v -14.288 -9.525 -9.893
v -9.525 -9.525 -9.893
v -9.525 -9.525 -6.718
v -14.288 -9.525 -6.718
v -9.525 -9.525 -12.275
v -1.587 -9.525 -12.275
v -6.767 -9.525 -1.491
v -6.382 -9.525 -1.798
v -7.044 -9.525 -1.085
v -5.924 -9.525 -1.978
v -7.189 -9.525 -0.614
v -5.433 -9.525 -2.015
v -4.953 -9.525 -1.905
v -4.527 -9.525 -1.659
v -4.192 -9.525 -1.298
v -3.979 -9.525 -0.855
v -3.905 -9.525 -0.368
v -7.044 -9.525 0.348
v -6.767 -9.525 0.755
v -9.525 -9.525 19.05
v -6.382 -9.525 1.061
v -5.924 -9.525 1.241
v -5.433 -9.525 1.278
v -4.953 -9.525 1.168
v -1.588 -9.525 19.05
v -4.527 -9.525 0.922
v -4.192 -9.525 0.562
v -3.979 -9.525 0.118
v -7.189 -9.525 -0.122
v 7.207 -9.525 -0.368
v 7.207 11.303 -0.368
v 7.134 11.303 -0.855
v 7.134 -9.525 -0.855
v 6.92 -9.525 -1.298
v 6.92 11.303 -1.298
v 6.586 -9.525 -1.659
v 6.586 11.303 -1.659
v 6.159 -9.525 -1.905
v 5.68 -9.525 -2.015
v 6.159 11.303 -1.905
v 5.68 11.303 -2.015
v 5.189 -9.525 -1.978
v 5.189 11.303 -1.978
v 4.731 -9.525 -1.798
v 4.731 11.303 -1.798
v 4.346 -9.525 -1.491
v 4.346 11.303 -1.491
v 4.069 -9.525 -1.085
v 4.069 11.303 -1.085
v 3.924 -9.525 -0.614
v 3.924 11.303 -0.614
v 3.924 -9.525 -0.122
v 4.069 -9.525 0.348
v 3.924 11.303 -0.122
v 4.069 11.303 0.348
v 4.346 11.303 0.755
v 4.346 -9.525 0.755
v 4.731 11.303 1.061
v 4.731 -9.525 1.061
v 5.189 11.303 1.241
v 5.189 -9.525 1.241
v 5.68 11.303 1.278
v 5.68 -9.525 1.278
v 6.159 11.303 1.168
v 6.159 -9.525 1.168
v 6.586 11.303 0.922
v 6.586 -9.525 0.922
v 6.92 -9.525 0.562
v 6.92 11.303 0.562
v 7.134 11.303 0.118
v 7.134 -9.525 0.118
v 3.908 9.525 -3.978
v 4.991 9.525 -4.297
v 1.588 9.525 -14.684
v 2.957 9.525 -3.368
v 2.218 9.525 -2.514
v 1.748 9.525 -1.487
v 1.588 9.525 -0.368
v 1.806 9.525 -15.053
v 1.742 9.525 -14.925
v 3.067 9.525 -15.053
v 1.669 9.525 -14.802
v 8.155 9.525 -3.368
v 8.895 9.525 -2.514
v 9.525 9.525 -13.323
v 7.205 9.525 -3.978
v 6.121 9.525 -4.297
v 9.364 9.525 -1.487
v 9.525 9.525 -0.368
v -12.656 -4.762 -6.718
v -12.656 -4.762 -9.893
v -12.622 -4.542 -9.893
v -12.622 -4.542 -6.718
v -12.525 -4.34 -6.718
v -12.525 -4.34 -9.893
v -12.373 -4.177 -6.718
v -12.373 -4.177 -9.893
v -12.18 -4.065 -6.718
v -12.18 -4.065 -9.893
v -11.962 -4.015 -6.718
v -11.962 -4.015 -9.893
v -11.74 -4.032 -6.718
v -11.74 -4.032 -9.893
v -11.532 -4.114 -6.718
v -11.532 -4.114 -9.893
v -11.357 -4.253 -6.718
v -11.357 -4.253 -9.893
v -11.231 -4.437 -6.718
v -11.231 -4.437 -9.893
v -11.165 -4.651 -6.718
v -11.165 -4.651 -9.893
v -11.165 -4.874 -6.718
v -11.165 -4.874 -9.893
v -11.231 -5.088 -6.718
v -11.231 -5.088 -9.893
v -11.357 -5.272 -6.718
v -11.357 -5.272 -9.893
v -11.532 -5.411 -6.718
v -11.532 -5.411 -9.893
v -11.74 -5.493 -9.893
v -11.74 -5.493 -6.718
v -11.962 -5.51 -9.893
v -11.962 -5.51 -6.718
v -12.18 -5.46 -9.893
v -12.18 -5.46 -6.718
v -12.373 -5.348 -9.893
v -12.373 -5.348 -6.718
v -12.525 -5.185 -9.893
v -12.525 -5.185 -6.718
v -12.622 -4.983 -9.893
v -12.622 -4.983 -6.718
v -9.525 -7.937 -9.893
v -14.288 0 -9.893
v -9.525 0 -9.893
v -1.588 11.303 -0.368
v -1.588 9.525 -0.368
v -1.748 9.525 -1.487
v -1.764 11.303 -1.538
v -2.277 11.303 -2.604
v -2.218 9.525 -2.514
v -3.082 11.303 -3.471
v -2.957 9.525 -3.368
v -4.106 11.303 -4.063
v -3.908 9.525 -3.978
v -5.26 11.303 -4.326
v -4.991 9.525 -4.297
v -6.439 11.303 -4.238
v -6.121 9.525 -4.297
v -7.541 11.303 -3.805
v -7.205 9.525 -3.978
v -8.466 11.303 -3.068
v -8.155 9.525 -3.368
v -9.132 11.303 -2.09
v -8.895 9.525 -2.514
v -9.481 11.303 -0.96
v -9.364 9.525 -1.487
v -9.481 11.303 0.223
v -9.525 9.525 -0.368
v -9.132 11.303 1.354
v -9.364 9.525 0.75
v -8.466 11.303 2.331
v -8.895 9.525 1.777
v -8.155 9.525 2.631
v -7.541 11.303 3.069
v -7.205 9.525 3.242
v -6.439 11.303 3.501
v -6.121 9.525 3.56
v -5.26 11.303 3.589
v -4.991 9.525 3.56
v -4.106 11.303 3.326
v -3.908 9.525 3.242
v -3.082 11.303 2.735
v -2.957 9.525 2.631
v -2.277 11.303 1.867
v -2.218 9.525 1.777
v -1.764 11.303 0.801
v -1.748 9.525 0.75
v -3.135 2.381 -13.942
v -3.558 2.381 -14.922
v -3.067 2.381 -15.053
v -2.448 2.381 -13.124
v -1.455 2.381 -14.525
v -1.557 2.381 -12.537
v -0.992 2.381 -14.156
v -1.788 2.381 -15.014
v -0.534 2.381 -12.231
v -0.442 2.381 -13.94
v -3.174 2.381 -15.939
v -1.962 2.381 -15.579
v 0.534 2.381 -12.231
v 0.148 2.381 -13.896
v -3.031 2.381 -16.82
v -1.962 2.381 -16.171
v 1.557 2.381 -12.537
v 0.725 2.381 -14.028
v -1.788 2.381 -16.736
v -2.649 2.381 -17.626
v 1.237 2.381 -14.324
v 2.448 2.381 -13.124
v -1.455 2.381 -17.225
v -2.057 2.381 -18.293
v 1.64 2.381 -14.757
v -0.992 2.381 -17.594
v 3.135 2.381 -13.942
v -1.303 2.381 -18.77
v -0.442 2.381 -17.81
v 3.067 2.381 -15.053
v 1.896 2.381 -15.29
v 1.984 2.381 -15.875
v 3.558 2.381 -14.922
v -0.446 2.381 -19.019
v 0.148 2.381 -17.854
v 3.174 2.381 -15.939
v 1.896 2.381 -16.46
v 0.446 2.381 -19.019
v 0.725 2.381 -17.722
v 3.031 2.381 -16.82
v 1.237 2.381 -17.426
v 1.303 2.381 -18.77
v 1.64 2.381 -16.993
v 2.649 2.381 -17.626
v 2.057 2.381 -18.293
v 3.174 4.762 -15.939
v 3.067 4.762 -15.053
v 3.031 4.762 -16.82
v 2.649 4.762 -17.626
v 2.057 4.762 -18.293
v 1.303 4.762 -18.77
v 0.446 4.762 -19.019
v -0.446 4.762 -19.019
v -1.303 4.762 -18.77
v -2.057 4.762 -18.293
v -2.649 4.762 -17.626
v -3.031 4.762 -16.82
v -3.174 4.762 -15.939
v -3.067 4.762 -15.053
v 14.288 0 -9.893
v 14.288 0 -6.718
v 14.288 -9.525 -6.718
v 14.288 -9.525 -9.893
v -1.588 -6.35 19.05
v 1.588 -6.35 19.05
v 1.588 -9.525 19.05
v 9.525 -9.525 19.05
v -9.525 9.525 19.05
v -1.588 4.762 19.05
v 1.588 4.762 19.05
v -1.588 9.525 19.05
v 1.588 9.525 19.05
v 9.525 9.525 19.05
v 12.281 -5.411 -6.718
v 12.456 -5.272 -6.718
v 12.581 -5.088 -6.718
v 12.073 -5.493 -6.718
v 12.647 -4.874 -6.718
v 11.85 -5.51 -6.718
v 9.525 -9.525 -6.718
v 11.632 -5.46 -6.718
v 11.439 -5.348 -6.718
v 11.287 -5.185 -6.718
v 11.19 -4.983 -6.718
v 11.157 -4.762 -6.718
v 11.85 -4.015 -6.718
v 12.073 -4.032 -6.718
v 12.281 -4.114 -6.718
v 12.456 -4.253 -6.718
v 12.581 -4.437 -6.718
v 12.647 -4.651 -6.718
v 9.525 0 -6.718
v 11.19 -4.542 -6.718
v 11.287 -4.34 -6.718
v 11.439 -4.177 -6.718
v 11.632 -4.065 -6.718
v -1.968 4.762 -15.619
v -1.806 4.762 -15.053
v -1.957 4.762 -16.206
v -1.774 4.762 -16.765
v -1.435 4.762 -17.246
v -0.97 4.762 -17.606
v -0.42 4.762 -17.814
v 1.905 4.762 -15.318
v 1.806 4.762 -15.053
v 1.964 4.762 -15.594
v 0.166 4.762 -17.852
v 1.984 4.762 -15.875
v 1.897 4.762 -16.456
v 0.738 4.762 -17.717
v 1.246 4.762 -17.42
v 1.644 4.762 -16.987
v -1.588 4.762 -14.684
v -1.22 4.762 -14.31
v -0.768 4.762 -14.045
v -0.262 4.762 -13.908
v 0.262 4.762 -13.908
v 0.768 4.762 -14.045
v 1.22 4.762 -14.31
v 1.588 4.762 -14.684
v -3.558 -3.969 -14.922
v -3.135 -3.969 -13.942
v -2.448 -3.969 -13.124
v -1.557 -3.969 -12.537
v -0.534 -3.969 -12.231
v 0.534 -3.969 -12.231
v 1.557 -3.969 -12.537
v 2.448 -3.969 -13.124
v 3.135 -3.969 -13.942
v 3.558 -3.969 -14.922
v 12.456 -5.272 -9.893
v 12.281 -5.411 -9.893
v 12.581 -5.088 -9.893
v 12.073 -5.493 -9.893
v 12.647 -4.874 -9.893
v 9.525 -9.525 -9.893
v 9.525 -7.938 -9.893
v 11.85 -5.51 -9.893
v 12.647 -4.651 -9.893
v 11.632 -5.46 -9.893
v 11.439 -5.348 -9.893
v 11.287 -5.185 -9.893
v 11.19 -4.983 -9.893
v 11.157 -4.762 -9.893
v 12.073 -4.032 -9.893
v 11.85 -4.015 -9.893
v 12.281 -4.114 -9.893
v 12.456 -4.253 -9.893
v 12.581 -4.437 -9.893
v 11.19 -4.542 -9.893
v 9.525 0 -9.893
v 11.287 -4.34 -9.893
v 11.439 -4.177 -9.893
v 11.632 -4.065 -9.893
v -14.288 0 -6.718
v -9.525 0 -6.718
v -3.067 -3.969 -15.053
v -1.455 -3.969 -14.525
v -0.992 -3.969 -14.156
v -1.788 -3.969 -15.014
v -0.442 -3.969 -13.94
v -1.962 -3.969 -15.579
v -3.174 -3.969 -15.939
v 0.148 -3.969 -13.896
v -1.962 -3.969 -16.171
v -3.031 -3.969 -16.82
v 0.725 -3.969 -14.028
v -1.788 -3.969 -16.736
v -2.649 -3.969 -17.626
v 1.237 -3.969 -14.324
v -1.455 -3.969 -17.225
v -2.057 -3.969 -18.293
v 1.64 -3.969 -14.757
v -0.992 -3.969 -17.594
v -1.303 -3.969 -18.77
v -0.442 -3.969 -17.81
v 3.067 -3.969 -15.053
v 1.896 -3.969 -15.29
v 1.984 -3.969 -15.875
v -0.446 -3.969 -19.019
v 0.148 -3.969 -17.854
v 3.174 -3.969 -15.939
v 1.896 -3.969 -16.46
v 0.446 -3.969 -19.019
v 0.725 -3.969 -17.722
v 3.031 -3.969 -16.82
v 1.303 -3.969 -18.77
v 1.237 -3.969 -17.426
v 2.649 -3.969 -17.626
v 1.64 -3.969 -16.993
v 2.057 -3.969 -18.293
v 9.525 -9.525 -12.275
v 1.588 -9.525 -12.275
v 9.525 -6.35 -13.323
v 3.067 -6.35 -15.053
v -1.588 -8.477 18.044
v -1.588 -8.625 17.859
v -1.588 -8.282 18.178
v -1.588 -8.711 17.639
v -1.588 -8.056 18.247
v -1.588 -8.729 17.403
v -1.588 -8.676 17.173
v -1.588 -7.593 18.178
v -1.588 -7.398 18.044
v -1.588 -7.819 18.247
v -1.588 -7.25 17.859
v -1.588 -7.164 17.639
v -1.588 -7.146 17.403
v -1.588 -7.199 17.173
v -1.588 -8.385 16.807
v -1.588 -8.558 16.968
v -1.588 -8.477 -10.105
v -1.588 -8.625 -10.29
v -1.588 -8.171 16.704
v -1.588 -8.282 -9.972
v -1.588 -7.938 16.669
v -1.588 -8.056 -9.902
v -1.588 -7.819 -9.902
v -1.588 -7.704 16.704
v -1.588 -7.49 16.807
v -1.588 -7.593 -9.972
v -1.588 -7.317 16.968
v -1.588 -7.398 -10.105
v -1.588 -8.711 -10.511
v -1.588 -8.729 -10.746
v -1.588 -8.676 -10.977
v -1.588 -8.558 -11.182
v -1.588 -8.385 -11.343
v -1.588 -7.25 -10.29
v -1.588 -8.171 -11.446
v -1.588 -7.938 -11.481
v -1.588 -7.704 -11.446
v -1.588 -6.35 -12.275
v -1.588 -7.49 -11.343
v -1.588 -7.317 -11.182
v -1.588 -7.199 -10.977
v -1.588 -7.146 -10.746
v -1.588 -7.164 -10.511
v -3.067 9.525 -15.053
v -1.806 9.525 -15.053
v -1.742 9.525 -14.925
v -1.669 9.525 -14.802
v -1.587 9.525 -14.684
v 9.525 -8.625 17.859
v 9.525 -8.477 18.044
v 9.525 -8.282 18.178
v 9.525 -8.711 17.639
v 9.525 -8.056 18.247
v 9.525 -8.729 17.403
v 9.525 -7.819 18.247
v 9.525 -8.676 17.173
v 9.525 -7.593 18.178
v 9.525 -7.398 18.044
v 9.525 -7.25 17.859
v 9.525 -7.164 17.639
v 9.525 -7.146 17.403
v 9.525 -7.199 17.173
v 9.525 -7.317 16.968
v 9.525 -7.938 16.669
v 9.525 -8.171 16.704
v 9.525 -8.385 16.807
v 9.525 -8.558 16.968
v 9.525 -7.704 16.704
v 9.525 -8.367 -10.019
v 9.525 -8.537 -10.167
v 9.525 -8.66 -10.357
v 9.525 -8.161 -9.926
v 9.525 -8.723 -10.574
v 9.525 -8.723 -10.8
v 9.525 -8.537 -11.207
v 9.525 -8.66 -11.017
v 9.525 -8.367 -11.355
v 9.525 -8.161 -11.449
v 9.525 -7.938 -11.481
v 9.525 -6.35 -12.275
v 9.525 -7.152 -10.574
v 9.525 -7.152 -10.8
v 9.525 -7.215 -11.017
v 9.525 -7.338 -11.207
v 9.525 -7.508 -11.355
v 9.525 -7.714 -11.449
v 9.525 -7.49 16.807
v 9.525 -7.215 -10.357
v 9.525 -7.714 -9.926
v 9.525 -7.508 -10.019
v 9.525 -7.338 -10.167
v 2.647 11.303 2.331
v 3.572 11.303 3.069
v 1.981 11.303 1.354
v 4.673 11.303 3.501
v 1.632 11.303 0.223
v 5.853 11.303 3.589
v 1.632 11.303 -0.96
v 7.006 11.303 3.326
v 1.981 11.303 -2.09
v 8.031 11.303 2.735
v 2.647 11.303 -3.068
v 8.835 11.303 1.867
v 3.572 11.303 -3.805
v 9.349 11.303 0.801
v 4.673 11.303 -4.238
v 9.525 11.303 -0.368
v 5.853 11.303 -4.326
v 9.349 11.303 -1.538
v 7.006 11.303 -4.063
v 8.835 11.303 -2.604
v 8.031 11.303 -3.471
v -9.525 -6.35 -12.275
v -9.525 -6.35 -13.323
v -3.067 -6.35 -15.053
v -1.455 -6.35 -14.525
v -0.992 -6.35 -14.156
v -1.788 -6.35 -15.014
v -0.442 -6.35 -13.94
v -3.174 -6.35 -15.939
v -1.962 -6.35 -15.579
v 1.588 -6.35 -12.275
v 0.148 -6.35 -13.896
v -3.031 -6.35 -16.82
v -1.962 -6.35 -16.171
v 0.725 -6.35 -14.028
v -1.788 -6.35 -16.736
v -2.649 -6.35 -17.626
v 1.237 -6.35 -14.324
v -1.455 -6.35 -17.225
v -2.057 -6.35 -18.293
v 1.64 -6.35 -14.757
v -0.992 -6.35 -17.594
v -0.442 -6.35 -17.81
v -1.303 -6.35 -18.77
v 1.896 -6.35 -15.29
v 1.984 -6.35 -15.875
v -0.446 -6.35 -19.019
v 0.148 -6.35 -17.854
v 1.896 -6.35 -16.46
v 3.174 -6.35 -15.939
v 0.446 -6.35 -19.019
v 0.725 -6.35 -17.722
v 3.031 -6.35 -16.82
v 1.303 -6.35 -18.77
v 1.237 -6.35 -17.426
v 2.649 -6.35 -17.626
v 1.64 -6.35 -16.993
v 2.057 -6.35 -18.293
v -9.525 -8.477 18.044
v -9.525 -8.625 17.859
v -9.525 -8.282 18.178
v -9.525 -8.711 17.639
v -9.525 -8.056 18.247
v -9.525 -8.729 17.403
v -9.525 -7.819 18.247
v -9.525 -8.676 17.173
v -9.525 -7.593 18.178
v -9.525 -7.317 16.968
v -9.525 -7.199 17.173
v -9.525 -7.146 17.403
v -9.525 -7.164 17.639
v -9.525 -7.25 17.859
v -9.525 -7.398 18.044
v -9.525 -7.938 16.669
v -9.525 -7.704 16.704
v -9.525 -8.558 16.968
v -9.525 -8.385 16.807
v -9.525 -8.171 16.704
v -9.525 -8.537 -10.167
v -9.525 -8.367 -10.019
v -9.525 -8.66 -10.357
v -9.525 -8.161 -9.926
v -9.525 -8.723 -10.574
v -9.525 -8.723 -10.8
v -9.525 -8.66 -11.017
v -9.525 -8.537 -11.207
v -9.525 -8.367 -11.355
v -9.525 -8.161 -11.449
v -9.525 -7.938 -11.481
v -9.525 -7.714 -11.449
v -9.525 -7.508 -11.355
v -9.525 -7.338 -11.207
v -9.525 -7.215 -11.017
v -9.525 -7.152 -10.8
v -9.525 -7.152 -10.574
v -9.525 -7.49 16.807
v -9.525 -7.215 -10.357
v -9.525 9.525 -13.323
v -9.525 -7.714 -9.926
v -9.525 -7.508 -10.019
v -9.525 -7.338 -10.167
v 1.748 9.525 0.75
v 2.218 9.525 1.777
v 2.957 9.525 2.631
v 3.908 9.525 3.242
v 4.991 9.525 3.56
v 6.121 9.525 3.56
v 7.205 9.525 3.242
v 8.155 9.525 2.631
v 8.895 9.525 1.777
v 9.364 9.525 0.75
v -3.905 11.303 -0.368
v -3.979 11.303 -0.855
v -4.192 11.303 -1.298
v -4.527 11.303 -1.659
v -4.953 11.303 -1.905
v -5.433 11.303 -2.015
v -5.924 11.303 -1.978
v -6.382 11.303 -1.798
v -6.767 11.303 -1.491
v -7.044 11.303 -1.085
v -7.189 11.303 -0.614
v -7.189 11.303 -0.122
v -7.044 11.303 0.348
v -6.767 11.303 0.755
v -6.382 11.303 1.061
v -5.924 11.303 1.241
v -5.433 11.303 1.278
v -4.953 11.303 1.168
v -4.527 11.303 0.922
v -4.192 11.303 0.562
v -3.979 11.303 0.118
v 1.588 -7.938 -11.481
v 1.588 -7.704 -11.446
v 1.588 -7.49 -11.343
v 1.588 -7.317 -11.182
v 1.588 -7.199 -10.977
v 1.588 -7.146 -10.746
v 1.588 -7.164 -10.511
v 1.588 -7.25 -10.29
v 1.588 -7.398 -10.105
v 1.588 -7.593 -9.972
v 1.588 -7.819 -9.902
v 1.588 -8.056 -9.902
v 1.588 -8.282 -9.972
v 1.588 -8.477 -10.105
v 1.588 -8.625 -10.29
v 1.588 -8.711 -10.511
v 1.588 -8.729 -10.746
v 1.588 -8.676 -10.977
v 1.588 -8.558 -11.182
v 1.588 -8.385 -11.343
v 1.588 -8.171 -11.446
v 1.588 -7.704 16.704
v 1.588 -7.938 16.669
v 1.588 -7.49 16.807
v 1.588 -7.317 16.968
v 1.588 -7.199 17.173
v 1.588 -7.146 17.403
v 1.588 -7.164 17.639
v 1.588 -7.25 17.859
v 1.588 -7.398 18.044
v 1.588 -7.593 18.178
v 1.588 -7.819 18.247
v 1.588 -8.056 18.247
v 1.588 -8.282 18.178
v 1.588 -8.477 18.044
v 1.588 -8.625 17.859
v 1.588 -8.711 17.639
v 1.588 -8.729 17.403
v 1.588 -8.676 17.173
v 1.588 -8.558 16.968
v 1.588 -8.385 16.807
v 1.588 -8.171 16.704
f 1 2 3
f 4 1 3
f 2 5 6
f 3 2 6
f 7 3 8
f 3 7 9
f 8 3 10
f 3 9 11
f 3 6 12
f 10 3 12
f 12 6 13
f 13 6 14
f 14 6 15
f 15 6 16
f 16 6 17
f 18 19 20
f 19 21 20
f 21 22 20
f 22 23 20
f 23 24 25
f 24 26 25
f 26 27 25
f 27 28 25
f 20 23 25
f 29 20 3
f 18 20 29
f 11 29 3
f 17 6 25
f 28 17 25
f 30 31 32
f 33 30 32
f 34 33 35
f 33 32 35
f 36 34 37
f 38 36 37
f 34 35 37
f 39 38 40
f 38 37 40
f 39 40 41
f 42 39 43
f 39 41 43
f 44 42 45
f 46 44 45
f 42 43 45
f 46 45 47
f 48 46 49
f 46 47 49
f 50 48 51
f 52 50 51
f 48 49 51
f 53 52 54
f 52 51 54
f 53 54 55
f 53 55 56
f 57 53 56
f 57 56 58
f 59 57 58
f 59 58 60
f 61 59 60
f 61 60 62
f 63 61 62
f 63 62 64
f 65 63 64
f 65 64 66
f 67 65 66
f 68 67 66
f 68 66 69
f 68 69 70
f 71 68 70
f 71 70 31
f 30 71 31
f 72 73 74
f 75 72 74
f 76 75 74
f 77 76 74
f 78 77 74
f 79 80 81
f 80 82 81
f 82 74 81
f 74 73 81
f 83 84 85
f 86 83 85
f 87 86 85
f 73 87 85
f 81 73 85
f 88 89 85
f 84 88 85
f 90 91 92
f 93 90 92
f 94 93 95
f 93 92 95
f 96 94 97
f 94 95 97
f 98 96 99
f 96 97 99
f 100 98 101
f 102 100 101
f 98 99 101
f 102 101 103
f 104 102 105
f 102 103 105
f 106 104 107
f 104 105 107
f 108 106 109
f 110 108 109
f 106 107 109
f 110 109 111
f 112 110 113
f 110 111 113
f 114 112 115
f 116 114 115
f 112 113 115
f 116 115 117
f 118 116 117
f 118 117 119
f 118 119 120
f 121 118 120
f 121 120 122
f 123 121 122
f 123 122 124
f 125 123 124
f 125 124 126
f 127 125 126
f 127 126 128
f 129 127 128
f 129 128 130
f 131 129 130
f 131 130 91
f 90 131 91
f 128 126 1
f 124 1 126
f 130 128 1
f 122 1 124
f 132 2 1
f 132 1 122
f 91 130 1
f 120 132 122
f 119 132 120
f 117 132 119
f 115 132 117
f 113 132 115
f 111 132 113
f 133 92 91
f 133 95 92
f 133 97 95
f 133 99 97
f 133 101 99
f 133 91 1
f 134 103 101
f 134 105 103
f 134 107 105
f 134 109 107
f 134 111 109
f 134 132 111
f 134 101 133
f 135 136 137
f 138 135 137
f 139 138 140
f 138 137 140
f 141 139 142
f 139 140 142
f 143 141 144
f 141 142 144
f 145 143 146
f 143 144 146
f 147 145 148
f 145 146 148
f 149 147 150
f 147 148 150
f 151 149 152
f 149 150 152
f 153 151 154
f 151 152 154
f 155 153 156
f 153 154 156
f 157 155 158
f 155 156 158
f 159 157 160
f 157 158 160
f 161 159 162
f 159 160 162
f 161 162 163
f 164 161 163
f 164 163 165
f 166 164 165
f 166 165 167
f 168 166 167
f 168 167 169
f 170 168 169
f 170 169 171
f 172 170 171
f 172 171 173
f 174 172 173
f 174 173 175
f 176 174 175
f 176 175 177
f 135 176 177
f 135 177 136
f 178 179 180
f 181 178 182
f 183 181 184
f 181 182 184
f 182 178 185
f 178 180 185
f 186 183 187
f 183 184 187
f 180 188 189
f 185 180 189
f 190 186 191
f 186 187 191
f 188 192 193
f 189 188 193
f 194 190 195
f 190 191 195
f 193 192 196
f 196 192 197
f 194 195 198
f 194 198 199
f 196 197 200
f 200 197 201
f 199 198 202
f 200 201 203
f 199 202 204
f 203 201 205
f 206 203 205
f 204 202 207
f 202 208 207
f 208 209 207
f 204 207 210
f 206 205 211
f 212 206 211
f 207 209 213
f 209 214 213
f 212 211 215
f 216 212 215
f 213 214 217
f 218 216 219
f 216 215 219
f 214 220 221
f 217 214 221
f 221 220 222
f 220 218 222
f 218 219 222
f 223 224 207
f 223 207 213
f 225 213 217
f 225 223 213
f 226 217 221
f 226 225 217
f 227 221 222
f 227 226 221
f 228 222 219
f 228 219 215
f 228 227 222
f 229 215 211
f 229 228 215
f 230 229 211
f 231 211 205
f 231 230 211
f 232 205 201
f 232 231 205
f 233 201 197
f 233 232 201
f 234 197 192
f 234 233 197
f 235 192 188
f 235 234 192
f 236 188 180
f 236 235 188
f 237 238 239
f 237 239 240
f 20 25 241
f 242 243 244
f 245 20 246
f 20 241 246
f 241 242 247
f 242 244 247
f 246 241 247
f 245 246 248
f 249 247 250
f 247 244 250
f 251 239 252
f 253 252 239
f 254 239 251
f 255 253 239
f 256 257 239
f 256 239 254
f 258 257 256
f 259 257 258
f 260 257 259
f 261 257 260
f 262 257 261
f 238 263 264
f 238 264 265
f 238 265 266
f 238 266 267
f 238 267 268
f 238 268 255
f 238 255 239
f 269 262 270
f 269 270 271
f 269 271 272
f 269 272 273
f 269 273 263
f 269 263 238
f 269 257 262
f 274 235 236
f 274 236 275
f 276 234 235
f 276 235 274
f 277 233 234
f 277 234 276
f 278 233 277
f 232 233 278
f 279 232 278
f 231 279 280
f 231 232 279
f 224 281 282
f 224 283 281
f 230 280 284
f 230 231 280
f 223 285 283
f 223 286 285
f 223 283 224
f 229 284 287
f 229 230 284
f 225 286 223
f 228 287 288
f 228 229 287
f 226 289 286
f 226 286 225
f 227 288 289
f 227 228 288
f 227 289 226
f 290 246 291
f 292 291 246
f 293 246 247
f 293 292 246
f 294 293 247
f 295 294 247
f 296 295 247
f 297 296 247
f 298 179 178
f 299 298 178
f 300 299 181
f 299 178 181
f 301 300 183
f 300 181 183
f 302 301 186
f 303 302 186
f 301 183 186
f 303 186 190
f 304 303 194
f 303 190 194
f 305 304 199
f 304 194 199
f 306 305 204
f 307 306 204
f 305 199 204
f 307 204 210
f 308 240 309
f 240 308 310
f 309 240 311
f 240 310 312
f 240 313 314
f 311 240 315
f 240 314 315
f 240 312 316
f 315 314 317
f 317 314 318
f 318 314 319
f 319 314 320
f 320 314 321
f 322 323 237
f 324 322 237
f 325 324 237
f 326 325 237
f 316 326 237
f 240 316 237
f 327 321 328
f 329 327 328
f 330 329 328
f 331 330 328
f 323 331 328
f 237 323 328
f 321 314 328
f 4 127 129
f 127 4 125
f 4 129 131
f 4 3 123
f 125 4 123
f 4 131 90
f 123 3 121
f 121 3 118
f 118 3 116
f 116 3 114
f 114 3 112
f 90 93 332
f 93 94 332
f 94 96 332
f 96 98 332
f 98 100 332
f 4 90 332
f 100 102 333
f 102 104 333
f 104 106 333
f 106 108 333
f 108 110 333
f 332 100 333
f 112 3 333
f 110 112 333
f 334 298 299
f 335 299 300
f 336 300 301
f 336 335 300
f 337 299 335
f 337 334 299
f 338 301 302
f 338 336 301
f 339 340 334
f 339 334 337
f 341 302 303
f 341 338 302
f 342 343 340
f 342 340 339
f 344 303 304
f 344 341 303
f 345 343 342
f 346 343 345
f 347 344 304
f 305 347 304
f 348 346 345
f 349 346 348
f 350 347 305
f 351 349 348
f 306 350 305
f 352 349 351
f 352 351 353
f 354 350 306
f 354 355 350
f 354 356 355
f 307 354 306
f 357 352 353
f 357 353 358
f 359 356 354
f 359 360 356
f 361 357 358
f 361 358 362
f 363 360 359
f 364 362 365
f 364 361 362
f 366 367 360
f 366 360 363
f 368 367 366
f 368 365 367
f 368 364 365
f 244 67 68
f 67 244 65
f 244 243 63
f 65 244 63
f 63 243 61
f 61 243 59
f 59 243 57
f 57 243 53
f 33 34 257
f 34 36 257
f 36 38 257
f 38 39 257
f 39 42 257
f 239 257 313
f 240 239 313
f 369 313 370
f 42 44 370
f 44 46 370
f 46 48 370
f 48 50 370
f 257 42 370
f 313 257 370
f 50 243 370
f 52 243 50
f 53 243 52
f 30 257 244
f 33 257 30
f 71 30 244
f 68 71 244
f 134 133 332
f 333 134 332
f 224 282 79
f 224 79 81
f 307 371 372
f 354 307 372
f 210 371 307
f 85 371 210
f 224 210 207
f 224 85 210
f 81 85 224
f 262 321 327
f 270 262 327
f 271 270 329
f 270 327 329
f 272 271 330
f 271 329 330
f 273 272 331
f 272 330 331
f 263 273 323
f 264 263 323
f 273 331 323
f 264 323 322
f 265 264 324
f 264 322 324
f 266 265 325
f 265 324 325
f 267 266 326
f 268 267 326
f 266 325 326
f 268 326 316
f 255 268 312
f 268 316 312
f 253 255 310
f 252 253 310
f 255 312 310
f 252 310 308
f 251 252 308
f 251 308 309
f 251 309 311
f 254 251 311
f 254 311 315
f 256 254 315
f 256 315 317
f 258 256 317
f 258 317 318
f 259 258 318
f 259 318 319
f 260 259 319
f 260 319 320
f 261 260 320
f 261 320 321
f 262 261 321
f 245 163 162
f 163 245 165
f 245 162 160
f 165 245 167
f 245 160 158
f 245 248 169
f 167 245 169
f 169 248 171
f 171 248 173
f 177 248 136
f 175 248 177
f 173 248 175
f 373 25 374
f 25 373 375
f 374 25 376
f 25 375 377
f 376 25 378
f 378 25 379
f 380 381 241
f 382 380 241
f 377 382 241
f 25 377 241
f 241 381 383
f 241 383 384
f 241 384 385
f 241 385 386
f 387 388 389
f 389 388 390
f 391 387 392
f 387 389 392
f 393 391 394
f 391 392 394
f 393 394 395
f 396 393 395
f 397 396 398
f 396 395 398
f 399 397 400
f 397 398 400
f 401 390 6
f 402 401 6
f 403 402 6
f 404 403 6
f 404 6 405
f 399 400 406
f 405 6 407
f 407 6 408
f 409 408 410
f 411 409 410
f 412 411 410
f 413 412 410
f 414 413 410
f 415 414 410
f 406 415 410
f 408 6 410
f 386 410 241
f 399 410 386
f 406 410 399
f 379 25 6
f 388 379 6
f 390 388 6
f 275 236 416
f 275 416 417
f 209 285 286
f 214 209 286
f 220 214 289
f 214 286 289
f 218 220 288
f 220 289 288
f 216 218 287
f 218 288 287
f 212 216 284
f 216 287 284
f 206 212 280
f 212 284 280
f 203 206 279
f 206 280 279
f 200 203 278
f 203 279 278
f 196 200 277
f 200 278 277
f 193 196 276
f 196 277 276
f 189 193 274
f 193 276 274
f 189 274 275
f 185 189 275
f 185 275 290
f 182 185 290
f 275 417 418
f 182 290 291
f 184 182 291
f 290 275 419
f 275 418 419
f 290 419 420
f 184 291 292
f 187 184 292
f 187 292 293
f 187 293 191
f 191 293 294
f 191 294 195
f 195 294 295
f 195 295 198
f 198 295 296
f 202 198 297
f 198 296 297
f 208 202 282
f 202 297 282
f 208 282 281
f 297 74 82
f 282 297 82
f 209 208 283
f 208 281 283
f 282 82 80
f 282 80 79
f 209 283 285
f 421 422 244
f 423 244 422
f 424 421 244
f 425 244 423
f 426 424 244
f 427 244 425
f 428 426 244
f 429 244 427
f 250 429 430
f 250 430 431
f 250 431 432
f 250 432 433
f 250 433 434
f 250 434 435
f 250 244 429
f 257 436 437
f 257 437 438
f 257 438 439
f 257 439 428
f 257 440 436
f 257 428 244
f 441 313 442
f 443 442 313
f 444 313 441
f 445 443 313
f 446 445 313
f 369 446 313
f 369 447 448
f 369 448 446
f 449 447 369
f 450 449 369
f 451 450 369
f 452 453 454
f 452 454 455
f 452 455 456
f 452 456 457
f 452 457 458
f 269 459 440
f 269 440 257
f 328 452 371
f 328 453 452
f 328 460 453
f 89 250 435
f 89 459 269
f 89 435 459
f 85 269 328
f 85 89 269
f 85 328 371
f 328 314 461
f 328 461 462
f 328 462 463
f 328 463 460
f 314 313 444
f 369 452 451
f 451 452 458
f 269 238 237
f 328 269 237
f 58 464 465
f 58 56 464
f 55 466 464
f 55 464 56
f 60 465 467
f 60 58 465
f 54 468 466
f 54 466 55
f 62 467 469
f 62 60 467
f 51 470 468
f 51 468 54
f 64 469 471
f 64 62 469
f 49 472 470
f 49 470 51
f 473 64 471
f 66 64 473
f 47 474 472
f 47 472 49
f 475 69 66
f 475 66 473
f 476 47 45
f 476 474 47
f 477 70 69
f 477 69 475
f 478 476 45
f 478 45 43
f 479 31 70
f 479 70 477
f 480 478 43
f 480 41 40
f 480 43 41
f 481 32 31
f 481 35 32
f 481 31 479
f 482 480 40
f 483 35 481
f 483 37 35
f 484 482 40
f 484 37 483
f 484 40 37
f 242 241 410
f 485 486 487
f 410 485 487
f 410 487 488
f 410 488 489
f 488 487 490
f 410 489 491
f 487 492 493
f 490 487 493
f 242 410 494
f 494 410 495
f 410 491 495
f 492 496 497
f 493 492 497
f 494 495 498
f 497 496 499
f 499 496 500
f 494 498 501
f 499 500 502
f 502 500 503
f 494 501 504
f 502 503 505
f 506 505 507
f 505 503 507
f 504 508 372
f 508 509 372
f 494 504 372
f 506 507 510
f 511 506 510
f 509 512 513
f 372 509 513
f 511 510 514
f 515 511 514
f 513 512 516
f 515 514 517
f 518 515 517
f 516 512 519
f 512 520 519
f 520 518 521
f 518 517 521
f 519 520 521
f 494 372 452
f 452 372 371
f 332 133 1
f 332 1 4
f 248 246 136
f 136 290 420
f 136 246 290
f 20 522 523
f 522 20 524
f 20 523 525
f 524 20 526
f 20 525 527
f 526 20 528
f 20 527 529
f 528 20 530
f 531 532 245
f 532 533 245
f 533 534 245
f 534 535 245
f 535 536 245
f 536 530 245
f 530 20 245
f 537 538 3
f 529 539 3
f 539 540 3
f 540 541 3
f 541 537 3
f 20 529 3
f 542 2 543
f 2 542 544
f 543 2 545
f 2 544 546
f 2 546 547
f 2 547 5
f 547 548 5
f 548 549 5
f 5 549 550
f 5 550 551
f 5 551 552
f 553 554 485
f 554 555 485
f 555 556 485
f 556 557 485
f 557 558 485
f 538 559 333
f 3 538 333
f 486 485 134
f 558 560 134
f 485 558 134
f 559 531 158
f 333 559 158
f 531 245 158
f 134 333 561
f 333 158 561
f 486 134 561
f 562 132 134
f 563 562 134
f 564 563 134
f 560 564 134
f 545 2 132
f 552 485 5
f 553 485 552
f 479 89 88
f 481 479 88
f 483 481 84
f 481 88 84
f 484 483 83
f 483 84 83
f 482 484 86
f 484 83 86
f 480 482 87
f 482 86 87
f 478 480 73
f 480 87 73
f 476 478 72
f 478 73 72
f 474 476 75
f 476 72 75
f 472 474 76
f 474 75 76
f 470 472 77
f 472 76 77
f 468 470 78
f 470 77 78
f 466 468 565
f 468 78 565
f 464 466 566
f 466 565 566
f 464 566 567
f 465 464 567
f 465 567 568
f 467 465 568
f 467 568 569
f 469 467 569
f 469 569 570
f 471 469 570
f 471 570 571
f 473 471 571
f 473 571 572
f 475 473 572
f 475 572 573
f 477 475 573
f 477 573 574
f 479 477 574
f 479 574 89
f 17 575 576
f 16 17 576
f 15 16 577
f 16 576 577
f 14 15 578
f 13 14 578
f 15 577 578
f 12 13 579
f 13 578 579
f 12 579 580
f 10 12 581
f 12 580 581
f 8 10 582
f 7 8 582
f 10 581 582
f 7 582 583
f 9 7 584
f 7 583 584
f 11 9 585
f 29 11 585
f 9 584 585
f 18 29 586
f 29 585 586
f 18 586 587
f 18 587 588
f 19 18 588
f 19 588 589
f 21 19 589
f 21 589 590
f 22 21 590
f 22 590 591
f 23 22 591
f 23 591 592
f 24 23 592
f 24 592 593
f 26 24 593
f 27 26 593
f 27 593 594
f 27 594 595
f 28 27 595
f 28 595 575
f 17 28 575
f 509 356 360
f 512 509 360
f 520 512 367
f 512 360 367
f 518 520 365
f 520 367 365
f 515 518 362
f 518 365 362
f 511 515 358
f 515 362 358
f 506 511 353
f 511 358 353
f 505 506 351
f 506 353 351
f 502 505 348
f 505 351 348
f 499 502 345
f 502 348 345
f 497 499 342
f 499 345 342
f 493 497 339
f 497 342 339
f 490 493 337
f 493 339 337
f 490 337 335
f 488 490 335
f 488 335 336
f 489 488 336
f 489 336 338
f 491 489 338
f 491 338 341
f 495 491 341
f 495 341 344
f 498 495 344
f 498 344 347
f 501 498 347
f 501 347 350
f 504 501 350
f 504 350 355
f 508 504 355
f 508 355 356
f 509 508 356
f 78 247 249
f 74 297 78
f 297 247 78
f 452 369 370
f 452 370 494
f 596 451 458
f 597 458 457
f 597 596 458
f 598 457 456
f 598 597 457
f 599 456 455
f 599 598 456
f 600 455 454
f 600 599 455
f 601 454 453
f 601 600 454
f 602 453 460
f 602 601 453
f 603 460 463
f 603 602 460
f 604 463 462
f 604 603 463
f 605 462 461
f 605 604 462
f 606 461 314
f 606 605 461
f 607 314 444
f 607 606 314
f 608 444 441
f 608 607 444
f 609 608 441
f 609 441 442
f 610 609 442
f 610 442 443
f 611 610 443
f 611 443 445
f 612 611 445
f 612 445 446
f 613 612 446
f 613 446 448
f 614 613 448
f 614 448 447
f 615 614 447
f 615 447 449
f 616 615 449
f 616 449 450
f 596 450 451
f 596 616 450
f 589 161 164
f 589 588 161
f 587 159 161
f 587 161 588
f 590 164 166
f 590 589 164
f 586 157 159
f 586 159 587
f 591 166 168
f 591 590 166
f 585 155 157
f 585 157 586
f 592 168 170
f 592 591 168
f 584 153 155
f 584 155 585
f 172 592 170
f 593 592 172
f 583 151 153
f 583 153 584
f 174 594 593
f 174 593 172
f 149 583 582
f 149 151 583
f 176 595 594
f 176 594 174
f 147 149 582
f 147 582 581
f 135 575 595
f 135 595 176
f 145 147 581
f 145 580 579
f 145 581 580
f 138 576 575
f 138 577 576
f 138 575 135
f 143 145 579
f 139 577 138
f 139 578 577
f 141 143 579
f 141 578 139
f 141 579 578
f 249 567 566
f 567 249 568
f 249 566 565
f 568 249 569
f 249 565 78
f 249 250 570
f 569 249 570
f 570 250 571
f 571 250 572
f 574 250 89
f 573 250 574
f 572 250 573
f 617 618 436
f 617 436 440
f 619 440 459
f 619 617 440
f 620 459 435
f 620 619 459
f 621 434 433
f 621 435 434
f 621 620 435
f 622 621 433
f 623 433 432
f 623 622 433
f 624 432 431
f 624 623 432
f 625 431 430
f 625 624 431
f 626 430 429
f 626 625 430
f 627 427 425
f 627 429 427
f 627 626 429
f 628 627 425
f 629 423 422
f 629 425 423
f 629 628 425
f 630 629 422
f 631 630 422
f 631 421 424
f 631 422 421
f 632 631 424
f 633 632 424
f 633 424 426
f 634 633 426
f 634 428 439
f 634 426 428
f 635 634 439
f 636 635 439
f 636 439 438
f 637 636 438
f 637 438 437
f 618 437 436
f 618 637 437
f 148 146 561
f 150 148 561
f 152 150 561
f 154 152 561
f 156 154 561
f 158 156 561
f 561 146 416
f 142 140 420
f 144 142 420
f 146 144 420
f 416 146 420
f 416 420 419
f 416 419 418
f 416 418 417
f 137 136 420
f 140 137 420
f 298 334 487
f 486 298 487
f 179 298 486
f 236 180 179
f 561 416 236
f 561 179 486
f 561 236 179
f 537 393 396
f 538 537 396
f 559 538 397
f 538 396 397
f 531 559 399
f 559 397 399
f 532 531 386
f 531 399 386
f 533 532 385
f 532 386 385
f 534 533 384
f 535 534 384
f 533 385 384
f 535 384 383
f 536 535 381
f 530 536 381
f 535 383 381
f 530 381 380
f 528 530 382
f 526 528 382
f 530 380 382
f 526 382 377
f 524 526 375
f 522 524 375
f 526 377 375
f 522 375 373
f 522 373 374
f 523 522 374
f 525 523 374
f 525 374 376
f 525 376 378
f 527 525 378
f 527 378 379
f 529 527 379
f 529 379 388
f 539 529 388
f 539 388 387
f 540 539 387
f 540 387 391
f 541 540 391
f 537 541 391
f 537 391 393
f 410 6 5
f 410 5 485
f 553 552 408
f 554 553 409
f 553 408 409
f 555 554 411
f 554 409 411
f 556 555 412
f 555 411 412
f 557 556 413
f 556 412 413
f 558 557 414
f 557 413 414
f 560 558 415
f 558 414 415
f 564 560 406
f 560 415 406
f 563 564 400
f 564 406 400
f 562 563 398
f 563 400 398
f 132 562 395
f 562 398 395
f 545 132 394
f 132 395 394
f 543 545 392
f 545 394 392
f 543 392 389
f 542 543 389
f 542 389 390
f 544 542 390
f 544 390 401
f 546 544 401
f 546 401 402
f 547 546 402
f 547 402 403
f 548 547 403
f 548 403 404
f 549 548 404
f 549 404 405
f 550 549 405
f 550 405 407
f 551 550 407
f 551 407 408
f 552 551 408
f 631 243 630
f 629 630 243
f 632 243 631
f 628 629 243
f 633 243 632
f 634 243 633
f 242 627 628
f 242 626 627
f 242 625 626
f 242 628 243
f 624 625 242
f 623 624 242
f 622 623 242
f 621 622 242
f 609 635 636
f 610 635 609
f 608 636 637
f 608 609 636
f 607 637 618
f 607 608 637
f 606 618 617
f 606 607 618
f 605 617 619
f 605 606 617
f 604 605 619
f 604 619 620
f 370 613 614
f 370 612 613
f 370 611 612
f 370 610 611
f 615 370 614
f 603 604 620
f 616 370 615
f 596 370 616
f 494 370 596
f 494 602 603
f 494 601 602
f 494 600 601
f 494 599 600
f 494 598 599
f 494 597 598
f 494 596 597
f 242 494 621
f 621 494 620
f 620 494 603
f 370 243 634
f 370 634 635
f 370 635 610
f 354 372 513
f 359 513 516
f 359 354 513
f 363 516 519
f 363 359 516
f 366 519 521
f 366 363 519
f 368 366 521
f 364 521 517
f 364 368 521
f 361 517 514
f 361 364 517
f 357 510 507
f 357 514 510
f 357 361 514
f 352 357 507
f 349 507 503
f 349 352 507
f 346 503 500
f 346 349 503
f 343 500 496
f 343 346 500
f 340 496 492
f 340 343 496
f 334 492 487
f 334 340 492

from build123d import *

# Parameters (mm, degrees)
SKETCH1_W                = 38.1
SKETCH1_H                = 19.05
BOSS_EXTRUDE1_DEPTH      = 9.525
CUT_EXTRUDE1_DEPTH       = 10.525
CUT_EXTRUDE1_DEPTH_BACK  = 10.525
SKETCH3_R                = 1.984375
CUT_EXTRUDE2_DEPTH       = 10.525
CUT_EXTRUDE2_DEPTH_BACK  = 10.525
SKETCH4_W                = 3.175
SKETCH4_H                = 4.7625
SKETCH4_H_2              = 3.175
CUT_EXTRUDE3_DEPTH       = 20.05
CUT_EXTRUDE3_DEPTH_BACK  = 20.05
CUT_EXTRUDE9_START       = -2.38125
SKETCH11_R               = 3.683
CUT_EXTRUDE9_DEPTH       = 6.35
SKETCH12_W               = 6.35
SKETCH12_H               = 3.175
CUT_EXTRUDE10_DEPTH      = 10.525
CUT_EXTRUDE10_DEPTH_BACK = 10.525
SKETCH14_R               = 0.79375
CUT_EXTRUDE11_DEPTH      = 10.525
CUT_EXTRUDE11_DEPTH_BACK = 10.525
CUT_EXTRUDE12_DEPTH      = 4.7625
SKETCH16_W               = 3.175
SKETCH16_H               = 9.525
BOSS_EXTRUDE2_DEPTH      = 4.7625
SKETCH17_W               = 3.175
SKETCH17_H               = 9.525
BOSS_EXTRUDE3_DEPTH      = 4.7625
SKETCH18_R               = 0.7493
CUT_EXTRUDE13_DEPTH      = 29.943380657
SKETCH19_R               = 3.96875
BOSS_EXTRUDE4_DEPTH      = 1.778
SKETCH20_R               = 1.651
CUT_EXTRUDE14_DEPTH      = 21.828


with BuildPart() as part:
    # Sketch1 → Boss-Extrude1 (new body, symmetric)
    with BuildSketch(Plane(origin=(0, 0, 0), x_dir=(0, 0, -1), z_dir=(1, 0, 0))):
        Rectangle(SKETCH1_W, SKETCH1_H)
    extrude(amount=BOSS_EXTRUDE1_DEPTH, both=True)

    # Sketch2 → Cut-Extrude1 (cut, two sides)
    with BuildSketch(Plane(origin=(0, 0, 0), x_dir=(1, 0, 0), z_dir=(0, 1, 0))) as cut_extrude1_sk:
        with BuildLine():
            Line((91.748361933, -8.708899487), (9.525, 13.322783942))
            Line((9.525, 13.322783942), (3.066814498, 15.053249532))
            ThreePointArc((3.066814498, 15.053249532), (0, 19.05), (-3.066814498, 15.053249532))
            Line((-3.066814498, 15.053249532), (-9.525, 13.322783942))
            Line((-9.525, 13.322783942), (-91.748361933, -8.708899487))
            Line((-91.748361933, -8.708899487), (-91.748361933, 161.538876678))
            Line((-91.748361933, 161.538876678), (91.748361933, 161.538876678))
            Line((91.748361933, 161.538876678), (91.748361933, -8.708899487))
        make_face()
    extrude(amount=CUT_EXTRUDE1_DEPTH, mode=Mode.SUBTRACT)
    extrude(cut_extrude1_sk.sketch, amount=-CUT_EXTRUDE1_DEPTH_BACK, mode=Mode.SUBTRACT)

    # Sketch3 → Cut-Extrude2 (cut, two sides)
    with BuildSketch(Plane(origin=(0, 0, 0), x_dir=(1, 0, 0), z_dir=(0, 1, 0))) as cut_extrude2_sk:
        with Locations((0, 15.875)):
            Circle(SKETCH3_R)
    extrude(amount=CUT_EXTRUDE2_DEPTH, mode=Mode.SUBTRACT)
    extrude(cut_extrude2_sk.sketch, amount=-CUT_EXTRUDE2_DEPTH_BACK, mode=Mode.SUBTRACT)

    # Sketch4 → Cut-Extrude3 (cut, two sides)
    with BuildSketch(Plane.XY) as cut_extrude3_sk:
        with Locations((0, 7.14375)):
            Rectangle(SKETCH4_W, SKETCH4_H)
        with Locations((0, -7.9375)):
            Rectangle(SKETCH4_W, SKETCH4_H_2)
    extrude(amount=CUT_EXTRUDE3_DEPTH, mode=Mode.SUBTRACT)
    extrude(cut_extrude3_sk.sketch, amount=-CUT_EXTRUDE3_DEPTH_BACK, mode=Mode.SUBTRACT)

    # Sketch11 → Cut-Extrude9 (cut)
    with BuildSketch(Plane(origin=(0, 4.7625, 0), x_dir=(1, 0, 0), z_dir=(0, 1, 0)).offset(CUT_EXTRUDE9_START)):
        with Locations((0, 15.875)):
            Circle(SKETCH11_R)
    extrude(amount=-CUT_EXTRUDE9_DEPTH, mode=Mode.SUBTRACT)

    # Sketch12 → Cut-Extrude10 (cut, two sides)
    with BuildSketch(Plane(origin=(0, 0, 0), x_dir=(0, 0, -1), z_dir=(1, 0, 0))) as cut_extrude10_sk:
        with Locations((15.449630657, -7.9375)):
            Rectangle(SKETCH12_W, SKETCH12_H)
    extrude(amount=CUT_EXTRUDE10_DEPTH, mode=Mode.SUBTRACT)
    extrude(cut_extrude10_sk.sketch, amount=-CUT_EXTRUDE10_DEPTH_BACK, mode=Mode.SUBTRACT)

    # Sketch14 → Cut-Extrude11 (cut, two sides)
    with BuildSketch(Plane(origin=(0, 0, 0), x_dir=(0, 0, -1), z_dir=(1, 0, 0))) as cut_extrude11_sk:
        with Locations((-17.4625, -7.9375)):
            Circle(SKETCH14_R)
        with Locations((10.687130657, -7.9375)):
            Circle(SKETCH14_R)
    extrude(amount=CUT_EXTRUDE11_DEPTH, mode=Mode.SUBTRACT)
    extrude(cut_extrude11_sk.sketch, amount=-CUT_EXTRUDE11_DEPTH_BACK, mode=Mode.SUBTRACT)

    # Sketch15 → Cut-Extrude12 (cut)
    with BuildSketch(Plane(origin=(0, 9.525, 0), x_dir=(1, 0, 0), z_dir=(0, 1, 0))):
        Polygon((-9.525, 13.322783942), (-3.066814498, 15.053249532), (3.066814498, 15.053249532), (9.525, 13.322783942), (9.525, 19.05), (-9.525, 19.05), align=None)
    extrude(amount=-CUT_EXTRUDE12_DEPTH, mode=Mode.SUBTRACT)

    # Sketch16 → Boss-Extrude2 (add)
    with BuildSketch(Plane(origin=(9.525, 0, 0), x_dir=(0, 0, -1), z_dir=(1, 0, 0))):
        with Locations((8.305880657, -4.7625)):
            Rectangle(SKETCH16_W, SKETCH16_H)
    extrude(amount=BOSS_EXTRUDE2_DEPTH)

    # Sketch17 → Boss-Extrude3 (add)
    with BuildSketch(Plane.ZY.offset(9.525)):
        with Locations((-8.305880657, -4.7625)):
            Rectangle(SKETCH17_W, SKETCH17_H)
    extrude(amount=BOSS_EXTRUDE3_DEPTH)

    # Sketch18 → Cut-Extrude13 (cut, through all)
    with BuildSketch(Plane(origin=(0, 0, -9.893380657), x_dir=(-1, 0, 0), z_dir=(0, 0, -1))):
        with Locations((-11.90625, -4.7625)):
            Circle(SKETCH18_R)
        with Locations((11.90625, -4.7625)):
            Circle(SKETCH18_R)
    extrude(amount=-CUT_EXTRUDE13_DEPTH, mode=Mode.SUBTRACT)

    # Sketch19 → Boss-Extrude4 (add)
    with BuildSketch(Plane(origin=(0, 9.525, 0), x_dir=(1, 0, 0), z_dir=(0, 1, 0))):
        with Locations((-5.55625, 0.368380657)):
            Circle(SKETCH19_R)
        with Locations((5.55625, 0.368380657)):
            Circle(SKETCH19_R)
    extrude(amount=BOSS_EXTRUDE4_DEPTH)

    # Sketch20 → Cut-Extrude14 (cut, through all)
    with BuildSketch(Plane(origin=(0, 11.303, 0), x_dir=(1, 0, 0), z_dir=(0, 1, 0))):
        with Locations((-5.55625, 0.368380657)):
            Circle(SKETCH20_R)
        with Locations((5.55625, 0.368380657)):
            Circle(SKETCH20_R)
    extrude(amount=-CUT_EXTRUDE14_DEPTH, mode=Mode.SUBTRACT)


solid = part.part
